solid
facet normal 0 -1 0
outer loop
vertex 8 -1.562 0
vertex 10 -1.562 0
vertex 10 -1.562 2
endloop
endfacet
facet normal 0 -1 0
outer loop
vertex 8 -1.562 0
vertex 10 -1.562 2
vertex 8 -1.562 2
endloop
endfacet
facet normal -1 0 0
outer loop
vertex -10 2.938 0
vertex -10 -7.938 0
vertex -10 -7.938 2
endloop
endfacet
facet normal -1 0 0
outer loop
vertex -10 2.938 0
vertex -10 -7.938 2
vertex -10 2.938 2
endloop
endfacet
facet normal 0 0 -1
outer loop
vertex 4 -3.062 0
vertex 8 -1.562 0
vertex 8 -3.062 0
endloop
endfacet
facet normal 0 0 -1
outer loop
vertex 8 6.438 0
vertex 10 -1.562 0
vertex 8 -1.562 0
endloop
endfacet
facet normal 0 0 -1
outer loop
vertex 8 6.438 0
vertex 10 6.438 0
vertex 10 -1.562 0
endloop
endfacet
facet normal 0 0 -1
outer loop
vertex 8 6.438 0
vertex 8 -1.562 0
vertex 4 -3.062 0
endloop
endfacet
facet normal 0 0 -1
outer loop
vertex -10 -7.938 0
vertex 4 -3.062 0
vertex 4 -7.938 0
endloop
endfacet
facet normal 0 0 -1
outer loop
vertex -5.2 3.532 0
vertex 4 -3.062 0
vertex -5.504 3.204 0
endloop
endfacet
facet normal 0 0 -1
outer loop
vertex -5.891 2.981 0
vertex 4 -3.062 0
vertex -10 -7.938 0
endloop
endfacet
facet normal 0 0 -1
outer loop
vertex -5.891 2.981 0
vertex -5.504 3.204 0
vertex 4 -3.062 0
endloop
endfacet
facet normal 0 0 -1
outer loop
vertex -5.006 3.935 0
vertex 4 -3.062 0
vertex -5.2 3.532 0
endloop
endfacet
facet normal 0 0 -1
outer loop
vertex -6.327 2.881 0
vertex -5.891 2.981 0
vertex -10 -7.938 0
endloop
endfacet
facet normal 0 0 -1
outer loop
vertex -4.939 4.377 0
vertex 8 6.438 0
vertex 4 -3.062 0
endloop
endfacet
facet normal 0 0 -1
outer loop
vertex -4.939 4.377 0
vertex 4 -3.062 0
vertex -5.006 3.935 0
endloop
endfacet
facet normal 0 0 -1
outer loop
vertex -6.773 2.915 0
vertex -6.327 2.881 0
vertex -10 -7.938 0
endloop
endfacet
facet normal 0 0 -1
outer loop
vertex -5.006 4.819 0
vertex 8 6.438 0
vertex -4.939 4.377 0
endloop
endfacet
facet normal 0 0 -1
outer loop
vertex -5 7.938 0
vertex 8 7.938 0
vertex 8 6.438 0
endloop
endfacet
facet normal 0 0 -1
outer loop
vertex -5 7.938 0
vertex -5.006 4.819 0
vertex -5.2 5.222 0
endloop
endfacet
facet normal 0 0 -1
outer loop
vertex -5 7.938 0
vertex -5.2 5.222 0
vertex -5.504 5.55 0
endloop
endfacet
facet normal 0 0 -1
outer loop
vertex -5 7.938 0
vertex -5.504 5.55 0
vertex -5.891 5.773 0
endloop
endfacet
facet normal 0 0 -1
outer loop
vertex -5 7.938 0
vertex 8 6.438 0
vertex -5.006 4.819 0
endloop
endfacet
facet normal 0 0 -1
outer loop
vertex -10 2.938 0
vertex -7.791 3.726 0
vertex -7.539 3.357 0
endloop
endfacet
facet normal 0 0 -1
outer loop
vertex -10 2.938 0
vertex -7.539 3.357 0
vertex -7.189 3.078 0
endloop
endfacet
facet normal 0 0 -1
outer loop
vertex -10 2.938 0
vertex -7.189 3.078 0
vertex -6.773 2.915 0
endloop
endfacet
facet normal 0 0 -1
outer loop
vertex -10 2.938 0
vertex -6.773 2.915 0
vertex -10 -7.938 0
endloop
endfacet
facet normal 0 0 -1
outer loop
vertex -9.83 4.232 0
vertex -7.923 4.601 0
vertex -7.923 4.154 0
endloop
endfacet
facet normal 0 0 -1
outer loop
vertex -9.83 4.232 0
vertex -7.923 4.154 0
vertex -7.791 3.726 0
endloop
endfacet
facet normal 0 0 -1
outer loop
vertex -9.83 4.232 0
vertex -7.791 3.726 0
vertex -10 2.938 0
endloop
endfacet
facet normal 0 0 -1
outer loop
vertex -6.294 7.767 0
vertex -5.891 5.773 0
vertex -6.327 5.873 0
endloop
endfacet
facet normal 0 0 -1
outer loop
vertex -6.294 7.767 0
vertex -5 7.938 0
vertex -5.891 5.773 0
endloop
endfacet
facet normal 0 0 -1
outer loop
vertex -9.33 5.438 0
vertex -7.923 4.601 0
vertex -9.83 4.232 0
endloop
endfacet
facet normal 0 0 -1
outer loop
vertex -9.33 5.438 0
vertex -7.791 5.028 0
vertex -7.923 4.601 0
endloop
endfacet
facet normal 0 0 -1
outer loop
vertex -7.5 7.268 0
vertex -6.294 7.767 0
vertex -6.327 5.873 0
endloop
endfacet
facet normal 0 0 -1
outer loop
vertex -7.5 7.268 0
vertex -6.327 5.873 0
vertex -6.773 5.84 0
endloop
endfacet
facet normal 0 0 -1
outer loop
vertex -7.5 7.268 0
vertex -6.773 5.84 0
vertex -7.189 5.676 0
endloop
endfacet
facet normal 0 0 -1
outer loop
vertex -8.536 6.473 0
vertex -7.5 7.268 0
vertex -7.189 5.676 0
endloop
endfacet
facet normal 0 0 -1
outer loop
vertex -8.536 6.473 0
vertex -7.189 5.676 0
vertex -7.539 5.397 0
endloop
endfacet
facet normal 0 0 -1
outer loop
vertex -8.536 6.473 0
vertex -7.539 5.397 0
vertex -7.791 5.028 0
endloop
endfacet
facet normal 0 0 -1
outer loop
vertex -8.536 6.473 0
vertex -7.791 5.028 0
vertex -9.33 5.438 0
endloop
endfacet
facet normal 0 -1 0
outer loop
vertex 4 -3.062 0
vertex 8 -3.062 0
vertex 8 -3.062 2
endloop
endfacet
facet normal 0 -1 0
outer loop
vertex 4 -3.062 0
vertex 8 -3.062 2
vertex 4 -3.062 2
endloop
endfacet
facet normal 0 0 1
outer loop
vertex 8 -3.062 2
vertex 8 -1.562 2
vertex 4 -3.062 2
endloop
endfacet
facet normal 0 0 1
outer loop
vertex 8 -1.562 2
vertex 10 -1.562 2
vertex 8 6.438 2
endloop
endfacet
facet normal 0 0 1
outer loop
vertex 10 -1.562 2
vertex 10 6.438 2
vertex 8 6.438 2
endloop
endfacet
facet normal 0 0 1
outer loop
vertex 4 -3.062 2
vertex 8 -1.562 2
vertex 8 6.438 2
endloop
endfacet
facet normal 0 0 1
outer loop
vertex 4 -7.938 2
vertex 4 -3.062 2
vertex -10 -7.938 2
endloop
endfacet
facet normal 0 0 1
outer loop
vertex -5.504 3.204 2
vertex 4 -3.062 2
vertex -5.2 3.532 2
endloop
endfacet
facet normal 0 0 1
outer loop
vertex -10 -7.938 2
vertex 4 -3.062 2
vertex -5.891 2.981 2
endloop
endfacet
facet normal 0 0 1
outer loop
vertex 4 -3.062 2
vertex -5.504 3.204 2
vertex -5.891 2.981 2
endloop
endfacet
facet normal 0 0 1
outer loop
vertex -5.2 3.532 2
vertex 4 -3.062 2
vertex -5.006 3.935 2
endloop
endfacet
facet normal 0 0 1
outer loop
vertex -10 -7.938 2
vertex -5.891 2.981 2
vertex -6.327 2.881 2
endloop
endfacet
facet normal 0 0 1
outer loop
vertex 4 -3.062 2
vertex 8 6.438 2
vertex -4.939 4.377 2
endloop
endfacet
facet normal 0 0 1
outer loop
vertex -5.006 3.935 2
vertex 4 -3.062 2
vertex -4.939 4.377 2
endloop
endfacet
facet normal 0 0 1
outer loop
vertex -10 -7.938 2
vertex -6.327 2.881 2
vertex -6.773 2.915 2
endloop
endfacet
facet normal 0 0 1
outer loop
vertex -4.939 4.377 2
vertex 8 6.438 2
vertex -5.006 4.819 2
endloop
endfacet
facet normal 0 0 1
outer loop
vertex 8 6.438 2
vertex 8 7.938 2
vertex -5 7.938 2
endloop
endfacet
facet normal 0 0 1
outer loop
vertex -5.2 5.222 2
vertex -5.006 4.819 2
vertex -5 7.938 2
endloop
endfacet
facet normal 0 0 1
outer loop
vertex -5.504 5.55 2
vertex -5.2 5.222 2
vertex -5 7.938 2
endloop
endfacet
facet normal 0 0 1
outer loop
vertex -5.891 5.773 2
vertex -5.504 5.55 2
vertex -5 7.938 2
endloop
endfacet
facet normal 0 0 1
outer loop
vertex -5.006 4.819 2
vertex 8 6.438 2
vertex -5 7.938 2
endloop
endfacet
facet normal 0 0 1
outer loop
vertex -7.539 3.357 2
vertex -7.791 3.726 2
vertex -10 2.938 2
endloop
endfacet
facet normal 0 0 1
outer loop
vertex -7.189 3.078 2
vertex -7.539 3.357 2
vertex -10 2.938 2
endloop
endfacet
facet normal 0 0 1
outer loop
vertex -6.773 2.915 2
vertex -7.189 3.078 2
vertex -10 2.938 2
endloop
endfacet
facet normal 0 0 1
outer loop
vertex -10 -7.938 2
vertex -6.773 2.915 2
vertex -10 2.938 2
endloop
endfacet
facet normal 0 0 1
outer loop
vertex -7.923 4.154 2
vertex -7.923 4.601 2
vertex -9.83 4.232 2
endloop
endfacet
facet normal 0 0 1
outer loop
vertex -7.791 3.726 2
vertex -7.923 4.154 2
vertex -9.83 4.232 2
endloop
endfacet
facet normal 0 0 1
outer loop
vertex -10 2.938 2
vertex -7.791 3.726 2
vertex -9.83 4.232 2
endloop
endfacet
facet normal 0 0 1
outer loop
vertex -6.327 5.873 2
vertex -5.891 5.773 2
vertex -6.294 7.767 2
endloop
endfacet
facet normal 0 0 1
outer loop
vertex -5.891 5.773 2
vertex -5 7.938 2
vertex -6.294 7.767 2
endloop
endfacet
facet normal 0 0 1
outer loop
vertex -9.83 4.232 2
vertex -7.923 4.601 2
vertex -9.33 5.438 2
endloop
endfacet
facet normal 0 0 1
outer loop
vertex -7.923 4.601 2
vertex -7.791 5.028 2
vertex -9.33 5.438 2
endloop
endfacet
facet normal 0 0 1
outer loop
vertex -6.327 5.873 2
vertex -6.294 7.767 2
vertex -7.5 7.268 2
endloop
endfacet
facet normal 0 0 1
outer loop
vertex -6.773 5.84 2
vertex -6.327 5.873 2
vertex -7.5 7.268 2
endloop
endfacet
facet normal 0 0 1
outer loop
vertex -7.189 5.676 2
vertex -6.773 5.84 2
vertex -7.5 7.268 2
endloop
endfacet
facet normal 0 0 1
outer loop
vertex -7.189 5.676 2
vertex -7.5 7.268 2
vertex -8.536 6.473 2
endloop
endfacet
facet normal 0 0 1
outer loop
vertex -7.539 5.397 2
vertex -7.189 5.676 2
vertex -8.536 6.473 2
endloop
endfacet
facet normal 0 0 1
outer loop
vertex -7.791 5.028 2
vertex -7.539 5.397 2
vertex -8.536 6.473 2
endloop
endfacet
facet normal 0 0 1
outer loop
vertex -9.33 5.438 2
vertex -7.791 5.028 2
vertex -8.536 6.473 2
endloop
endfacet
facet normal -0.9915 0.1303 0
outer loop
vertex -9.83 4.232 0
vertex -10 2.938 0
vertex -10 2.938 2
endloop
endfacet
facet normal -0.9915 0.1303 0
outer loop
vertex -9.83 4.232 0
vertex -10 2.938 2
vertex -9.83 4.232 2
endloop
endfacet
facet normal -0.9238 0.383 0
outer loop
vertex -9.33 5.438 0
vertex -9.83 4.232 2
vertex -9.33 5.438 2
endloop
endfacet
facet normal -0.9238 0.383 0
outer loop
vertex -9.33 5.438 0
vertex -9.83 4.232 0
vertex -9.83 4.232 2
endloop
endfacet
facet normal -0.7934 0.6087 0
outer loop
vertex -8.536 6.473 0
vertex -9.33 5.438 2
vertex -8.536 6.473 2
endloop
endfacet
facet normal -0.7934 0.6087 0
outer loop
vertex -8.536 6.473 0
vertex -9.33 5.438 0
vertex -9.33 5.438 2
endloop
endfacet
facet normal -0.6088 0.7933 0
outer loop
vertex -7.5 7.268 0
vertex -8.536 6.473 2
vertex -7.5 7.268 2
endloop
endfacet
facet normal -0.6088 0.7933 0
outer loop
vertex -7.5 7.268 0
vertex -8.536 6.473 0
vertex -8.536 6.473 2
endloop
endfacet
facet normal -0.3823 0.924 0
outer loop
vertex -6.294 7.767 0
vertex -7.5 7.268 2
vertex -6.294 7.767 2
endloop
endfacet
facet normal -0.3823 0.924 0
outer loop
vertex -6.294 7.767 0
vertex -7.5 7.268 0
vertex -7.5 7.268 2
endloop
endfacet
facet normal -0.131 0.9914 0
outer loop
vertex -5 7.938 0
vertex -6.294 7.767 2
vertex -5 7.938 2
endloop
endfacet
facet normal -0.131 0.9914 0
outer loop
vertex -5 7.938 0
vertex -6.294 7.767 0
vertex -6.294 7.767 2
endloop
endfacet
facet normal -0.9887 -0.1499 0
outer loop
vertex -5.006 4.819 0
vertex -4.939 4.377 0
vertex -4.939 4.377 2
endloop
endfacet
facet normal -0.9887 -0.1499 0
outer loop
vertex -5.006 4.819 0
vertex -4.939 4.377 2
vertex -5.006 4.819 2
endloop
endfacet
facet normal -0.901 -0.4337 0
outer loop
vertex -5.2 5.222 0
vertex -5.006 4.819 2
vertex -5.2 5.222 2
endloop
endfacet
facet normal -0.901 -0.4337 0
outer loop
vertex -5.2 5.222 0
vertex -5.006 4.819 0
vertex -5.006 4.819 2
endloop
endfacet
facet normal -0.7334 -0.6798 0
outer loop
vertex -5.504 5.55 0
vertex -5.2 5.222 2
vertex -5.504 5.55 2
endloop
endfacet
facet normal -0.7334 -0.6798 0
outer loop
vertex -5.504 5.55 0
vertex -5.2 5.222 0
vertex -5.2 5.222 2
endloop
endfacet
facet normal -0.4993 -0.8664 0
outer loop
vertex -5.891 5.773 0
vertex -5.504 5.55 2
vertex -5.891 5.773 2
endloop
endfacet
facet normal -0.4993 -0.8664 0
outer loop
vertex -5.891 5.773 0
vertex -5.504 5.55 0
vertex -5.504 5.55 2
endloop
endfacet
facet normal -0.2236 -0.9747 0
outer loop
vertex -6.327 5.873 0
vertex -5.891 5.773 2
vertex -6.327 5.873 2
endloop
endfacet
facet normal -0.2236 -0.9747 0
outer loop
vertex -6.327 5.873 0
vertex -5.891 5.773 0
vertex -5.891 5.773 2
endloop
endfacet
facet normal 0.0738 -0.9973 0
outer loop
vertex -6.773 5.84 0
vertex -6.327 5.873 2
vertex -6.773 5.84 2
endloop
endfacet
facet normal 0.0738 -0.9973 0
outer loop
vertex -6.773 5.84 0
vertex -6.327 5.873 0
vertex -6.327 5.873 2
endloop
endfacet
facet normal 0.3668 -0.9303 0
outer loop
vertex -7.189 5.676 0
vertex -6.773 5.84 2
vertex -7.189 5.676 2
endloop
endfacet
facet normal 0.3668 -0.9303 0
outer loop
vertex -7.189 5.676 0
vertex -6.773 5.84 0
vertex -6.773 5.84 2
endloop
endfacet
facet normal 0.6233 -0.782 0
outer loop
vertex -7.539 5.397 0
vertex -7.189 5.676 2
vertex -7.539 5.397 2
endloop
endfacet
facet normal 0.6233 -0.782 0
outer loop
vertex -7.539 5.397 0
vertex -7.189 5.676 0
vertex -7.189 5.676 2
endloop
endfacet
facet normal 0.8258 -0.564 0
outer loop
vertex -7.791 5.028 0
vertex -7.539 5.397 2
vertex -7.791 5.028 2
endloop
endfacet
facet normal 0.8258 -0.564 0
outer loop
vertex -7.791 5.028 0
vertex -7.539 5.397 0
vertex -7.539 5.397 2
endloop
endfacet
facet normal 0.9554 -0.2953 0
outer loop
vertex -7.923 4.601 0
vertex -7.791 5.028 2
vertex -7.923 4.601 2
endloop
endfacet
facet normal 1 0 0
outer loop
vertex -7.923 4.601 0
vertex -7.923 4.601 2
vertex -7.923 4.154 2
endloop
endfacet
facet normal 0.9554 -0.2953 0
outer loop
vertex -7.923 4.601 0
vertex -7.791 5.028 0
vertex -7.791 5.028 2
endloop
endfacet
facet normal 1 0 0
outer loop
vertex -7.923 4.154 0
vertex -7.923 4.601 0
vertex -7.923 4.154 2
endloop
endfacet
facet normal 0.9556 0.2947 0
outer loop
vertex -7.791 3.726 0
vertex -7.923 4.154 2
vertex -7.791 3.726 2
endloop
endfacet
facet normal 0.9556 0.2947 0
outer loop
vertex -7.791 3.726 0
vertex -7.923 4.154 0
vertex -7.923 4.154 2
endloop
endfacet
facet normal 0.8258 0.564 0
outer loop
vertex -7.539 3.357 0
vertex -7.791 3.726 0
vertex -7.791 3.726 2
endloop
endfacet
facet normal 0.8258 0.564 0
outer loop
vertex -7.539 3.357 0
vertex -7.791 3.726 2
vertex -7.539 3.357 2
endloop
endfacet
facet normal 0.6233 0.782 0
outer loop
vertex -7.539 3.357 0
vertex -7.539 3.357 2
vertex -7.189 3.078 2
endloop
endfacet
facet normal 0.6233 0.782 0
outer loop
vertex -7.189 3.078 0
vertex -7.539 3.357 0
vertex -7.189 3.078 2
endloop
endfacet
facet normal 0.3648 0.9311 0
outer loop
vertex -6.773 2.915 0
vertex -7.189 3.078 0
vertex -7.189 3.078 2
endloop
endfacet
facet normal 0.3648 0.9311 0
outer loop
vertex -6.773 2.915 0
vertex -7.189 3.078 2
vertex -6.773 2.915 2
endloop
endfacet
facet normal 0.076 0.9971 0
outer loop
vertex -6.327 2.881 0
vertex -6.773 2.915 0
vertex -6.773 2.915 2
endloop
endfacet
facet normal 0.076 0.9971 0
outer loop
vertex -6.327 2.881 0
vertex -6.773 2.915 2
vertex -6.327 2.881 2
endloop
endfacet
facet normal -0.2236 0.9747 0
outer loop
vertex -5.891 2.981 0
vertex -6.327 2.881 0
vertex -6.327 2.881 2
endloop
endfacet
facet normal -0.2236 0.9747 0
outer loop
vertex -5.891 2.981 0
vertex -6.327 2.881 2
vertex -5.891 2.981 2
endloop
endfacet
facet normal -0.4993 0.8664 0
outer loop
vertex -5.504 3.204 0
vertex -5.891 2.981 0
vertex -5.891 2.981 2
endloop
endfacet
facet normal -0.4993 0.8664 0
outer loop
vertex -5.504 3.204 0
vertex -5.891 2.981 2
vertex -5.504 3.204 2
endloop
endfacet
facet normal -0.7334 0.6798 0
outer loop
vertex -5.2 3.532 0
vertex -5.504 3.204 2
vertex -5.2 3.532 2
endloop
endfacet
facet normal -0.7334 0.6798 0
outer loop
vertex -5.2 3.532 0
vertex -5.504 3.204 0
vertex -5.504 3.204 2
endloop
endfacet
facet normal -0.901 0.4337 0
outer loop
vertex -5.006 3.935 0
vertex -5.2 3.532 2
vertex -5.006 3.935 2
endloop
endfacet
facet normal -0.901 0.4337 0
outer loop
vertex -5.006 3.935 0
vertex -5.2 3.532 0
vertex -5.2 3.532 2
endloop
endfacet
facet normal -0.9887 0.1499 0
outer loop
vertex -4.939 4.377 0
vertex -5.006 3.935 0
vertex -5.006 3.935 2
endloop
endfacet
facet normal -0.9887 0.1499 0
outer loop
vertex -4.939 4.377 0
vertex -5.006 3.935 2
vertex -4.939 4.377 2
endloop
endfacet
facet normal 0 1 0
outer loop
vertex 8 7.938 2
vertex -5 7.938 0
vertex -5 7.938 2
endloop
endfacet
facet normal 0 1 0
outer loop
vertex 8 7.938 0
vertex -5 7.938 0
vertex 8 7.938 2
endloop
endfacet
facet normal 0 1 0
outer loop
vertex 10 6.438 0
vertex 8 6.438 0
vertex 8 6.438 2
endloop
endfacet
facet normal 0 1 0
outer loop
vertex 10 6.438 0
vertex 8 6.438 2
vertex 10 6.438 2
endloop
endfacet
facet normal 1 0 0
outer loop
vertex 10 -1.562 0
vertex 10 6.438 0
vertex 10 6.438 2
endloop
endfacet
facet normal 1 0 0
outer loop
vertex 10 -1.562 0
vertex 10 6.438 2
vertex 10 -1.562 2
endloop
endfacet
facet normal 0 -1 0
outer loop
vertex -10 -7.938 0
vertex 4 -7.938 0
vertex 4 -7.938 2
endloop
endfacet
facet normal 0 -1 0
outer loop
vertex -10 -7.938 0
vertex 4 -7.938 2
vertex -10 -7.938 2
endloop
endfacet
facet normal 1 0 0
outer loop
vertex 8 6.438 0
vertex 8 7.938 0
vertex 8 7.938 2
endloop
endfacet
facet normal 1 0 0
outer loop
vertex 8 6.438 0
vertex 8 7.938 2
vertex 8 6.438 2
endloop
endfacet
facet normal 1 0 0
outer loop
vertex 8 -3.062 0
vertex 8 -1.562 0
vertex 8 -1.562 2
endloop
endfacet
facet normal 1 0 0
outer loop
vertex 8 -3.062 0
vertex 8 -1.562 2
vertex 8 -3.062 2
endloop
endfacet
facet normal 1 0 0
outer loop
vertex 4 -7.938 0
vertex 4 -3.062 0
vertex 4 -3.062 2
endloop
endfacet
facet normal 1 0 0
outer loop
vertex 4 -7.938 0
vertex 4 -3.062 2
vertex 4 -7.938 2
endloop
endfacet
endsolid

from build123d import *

# Parameters (mm, degrees)
SKETCH1_R           = 1.5
BOSS_EXTRUDE1_DEPTH = 2


with BuildPart() as part:
    # Sketch1 → Boss-Extrude1 (new body)
    with BuildSketch(Plane.XY):
        with BuildLine():
            Line((10, -1.562186701), (8, -1.562186701))
            Line((8, -1.562186701), (8, -3.062186701))
            Line((8, -3.062186701), (4, -3.062186701))
            Line((4, -3.062186701), (4, -7.937813299))
            Line((4, -7.937813299), (-10, -7.937813299))
            Line((-10, -7.937813299), (-10, 2.937813299))
            ThreePointArc((-10, 2.937813299), (-8.535533906, 6.473347205), (-5, 7.937813299))
            Line((-5, 7.937813299), (8, 7.937813299))
            Line((8, 7.937813299), (8, 6.437813299))
            Line((8, 6.437813299), (10, 6.437813299))
            Line((10, 6.437813299), (10, -1.562186701))
        make_face()
        with Locations((-6.439339828, 4.377153127)):
            Circle(SKETCH1_R, mode=Mode.SUBTRACT)
    extrude(amount=BOSS_EXTRUDE1_DEPTH)


solid = part.part
